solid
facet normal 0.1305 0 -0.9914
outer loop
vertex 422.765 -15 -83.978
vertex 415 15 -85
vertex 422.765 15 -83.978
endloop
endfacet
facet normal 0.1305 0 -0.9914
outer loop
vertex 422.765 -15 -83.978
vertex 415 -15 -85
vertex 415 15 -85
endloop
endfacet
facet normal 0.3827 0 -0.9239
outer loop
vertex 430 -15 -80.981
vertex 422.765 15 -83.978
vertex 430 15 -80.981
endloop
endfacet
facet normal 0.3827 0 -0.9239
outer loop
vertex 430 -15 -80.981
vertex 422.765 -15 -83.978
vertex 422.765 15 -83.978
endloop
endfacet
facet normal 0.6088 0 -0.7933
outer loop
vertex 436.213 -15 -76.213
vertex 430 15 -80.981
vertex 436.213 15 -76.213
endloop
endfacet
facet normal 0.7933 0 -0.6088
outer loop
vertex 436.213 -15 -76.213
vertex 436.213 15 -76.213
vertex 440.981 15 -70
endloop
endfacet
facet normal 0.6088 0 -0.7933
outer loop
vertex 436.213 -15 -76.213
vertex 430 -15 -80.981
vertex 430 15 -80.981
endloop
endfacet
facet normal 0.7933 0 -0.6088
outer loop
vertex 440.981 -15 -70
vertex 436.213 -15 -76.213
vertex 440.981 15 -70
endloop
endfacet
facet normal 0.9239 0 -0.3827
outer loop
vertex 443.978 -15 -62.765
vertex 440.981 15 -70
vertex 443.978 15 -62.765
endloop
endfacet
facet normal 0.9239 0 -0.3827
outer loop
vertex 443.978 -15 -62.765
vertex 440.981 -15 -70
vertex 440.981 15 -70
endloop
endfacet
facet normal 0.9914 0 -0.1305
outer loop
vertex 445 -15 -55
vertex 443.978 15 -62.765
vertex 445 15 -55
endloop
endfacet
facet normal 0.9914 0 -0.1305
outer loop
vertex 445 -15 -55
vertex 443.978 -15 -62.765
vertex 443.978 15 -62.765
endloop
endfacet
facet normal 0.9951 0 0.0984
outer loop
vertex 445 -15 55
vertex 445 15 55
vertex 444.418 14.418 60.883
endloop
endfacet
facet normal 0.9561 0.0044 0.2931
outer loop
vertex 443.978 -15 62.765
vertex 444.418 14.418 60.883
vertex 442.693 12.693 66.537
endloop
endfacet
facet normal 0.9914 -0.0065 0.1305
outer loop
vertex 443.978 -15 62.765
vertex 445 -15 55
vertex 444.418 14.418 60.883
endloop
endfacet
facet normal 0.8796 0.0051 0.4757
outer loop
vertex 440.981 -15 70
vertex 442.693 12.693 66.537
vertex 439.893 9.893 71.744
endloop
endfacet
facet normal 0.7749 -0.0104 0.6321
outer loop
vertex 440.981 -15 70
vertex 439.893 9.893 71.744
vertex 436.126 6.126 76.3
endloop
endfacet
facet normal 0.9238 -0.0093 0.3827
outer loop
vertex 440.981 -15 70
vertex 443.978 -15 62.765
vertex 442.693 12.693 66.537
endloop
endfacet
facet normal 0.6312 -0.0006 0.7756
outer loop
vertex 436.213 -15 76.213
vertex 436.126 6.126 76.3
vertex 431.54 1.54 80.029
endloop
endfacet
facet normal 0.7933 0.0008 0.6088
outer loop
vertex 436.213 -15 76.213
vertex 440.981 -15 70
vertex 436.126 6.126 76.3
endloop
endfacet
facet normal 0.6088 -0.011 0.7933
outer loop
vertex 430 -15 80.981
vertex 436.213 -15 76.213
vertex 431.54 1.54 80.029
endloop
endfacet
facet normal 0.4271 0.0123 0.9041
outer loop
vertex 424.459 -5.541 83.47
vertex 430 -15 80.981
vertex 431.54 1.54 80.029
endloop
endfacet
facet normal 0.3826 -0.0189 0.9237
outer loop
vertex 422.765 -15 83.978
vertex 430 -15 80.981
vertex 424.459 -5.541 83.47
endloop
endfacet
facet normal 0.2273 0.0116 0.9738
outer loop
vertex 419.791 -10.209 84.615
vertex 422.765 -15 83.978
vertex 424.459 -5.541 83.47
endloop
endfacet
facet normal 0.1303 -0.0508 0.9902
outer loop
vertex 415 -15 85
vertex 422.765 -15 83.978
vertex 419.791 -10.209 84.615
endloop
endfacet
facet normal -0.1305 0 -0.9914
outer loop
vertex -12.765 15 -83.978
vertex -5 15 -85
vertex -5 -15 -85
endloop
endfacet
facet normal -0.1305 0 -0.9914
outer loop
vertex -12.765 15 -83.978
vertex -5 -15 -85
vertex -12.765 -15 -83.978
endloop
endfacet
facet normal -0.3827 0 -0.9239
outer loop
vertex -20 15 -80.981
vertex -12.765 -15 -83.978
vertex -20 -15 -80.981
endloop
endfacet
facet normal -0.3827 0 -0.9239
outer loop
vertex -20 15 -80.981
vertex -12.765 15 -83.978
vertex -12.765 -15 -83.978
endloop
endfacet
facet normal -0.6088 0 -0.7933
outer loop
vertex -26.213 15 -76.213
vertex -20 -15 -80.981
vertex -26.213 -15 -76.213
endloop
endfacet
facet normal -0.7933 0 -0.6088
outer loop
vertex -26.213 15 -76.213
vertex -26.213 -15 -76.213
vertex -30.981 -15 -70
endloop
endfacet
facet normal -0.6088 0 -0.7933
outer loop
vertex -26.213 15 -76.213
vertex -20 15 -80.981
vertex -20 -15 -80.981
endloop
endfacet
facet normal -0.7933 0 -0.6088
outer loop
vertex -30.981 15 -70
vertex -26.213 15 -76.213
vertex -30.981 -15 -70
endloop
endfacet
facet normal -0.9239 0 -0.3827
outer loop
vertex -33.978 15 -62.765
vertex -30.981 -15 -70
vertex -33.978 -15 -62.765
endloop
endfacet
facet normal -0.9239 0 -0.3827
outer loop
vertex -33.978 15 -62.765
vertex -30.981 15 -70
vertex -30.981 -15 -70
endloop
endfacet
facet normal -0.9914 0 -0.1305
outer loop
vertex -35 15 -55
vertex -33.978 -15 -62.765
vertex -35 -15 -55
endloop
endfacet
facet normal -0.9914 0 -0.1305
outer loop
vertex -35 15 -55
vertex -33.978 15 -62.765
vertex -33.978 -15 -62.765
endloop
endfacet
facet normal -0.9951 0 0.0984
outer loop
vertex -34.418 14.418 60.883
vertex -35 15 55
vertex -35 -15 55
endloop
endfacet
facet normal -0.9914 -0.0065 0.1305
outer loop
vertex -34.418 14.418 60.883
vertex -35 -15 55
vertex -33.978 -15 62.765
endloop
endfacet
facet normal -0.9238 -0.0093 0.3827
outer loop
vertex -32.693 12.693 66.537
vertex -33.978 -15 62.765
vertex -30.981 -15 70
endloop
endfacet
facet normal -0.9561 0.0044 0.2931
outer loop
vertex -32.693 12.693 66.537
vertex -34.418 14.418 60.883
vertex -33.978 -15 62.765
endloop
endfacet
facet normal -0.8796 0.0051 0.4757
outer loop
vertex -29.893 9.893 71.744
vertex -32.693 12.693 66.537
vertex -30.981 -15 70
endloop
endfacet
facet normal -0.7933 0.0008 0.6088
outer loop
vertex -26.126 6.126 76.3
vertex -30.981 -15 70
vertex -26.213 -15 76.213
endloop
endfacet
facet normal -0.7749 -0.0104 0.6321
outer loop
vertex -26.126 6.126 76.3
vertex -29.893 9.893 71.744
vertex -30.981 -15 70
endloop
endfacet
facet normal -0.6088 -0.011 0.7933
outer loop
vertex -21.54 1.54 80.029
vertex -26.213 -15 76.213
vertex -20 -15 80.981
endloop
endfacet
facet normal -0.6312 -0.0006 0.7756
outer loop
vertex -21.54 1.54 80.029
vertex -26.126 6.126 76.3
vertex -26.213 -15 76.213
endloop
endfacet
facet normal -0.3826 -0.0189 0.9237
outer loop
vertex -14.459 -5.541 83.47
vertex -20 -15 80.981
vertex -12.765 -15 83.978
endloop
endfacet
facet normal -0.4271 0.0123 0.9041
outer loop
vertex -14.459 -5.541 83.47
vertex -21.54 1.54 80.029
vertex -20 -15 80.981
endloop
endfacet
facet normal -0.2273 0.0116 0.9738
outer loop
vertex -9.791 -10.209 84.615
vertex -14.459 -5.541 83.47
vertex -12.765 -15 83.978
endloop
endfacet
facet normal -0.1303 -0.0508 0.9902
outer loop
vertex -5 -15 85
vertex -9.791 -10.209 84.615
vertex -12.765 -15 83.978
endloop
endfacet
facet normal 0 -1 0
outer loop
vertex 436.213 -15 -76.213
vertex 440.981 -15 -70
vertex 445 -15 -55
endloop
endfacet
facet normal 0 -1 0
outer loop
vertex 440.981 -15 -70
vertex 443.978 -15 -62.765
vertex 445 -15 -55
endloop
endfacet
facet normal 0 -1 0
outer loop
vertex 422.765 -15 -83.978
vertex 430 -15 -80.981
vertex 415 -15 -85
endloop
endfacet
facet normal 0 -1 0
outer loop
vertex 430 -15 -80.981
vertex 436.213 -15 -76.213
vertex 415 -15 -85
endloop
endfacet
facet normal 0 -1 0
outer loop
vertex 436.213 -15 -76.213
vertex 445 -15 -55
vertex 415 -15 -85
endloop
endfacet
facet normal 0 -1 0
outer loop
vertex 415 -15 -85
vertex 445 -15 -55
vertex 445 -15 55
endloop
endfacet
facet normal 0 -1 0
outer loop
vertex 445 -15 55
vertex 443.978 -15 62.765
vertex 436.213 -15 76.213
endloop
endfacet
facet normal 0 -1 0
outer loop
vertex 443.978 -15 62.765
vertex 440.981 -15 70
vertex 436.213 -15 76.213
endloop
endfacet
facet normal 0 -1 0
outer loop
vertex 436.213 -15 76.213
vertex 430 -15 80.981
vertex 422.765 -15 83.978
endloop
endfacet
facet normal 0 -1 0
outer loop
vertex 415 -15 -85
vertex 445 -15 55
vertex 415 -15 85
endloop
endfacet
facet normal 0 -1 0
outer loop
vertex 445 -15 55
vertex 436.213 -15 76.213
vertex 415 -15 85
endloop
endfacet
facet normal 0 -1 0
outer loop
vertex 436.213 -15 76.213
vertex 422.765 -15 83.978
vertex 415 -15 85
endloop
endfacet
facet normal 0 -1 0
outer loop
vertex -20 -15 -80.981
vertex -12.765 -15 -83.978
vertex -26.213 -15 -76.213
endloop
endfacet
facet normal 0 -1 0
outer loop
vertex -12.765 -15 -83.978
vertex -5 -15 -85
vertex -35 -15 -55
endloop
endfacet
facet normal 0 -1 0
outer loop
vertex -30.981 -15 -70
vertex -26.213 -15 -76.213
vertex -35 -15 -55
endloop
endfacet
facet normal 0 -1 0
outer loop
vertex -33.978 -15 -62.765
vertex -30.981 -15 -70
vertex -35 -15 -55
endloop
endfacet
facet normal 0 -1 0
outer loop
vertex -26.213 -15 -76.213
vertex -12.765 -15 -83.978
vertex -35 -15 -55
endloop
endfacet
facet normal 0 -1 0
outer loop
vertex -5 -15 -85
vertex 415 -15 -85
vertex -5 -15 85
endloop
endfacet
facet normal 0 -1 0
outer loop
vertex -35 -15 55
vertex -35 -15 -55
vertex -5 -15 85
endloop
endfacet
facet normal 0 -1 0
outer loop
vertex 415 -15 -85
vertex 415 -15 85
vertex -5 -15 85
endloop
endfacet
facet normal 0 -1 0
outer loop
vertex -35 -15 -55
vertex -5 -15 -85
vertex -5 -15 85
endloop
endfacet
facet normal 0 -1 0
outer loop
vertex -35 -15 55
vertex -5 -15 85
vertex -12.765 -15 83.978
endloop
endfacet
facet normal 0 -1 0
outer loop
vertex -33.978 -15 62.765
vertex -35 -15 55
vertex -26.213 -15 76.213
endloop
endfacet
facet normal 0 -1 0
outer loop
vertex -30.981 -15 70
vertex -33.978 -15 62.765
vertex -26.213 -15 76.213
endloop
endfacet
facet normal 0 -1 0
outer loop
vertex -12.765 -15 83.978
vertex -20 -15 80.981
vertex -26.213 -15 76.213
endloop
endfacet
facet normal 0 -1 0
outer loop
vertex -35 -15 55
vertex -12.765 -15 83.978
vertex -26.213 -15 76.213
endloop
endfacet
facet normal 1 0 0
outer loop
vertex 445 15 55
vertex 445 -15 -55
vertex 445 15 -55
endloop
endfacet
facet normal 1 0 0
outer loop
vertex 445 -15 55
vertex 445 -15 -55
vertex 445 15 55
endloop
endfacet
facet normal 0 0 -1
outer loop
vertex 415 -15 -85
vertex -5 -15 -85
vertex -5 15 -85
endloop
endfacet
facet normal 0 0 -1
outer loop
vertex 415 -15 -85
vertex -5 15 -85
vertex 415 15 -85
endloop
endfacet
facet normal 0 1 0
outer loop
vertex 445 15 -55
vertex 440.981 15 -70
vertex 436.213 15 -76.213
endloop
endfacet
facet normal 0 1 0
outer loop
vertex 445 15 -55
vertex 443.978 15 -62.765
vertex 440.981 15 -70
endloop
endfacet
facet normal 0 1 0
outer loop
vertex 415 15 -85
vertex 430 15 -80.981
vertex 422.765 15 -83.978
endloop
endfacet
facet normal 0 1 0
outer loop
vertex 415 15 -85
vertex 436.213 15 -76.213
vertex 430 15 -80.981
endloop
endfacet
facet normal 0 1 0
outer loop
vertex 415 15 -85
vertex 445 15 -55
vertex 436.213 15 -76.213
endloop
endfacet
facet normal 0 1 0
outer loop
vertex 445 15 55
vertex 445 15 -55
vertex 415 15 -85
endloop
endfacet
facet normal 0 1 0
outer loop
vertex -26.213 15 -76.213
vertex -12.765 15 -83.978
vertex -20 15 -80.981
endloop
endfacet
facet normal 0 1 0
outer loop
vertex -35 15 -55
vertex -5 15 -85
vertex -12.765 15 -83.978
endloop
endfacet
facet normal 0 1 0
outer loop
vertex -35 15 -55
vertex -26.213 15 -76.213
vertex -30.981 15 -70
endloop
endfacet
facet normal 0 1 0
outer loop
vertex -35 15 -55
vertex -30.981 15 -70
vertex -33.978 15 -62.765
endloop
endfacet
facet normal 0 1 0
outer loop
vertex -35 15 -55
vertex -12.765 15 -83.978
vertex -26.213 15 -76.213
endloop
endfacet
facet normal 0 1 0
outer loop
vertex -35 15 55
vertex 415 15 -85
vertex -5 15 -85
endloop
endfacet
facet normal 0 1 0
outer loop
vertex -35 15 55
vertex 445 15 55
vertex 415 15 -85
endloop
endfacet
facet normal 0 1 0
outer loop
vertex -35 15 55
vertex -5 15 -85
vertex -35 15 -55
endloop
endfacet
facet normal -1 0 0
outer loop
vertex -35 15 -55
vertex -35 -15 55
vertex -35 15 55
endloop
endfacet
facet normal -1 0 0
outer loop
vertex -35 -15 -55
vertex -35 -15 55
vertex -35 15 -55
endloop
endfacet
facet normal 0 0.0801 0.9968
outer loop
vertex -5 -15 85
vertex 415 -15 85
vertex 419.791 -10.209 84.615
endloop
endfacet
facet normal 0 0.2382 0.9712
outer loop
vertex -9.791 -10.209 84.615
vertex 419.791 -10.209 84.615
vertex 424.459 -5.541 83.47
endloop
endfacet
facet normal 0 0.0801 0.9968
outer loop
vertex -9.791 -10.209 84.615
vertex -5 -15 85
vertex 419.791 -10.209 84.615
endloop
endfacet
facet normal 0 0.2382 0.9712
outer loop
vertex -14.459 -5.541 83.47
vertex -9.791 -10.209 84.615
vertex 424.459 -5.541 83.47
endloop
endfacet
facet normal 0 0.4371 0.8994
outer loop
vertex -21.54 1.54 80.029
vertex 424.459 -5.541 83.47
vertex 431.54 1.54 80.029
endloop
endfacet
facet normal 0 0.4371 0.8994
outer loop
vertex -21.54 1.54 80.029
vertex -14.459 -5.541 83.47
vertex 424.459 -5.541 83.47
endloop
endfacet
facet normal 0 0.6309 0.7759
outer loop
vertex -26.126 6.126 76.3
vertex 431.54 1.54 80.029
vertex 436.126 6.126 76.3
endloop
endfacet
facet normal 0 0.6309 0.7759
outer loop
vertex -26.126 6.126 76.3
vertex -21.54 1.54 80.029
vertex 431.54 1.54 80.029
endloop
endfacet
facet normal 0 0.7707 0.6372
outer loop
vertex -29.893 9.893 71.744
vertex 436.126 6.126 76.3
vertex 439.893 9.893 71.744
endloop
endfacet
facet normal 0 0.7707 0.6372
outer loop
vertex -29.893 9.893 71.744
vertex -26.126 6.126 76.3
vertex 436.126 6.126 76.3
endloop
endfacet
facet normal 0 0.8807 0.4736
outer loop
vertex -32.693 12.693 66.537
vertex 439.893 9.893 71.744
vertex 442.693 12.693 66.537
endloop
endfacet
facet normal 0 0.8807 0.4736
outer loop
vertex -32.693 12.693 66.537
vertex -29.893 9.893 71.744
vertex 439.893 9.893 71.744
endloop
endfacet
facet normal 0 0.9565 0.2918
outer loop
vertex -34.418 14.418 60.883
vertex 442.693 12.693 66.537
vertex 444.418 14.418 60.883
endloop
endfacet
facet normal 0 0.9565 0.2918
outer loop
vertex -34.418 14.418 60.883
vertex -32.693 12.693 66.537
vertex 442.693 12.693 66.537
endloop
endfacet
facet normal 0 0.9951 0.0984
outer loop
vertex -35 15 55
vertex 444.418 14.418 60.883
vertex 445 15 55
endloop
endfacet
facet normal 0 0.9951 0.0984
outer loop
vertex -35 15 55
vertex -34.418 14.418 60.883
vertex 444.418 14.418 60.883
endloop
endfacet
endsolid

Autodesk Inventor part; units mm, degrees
ref_plane "YZ Plane" through (0, 0, 0) normal (1, 0, 0) x (0, 1, 0)
ref_plane "XZ Plane" through (0, 0, 0) normal (0, 1, 0) x (-1, 0, 0)
ref_plane "XY Plane" through (0, 0, 0) normal (0, 0, 1) x (1, 0, 0)
sketch "Эскиз1" plane through (0, 0, 0) normal (0, 1, 0) x (-1, 0, 0)
  line L0 (35, -85) -> (-445, -85)
  line L1 (-445, -85) -> (-445, 85)
  line L2 (-445, 85) -> (35, 85)
  line L3 (35, 85) -> (35, -85)
  point P0 (0, 0)
  point P1 (35, 0)
  dimension "d0" = 480
  dimension "d1" = 170
  dimension "d2" = 35
extrude "Выдавливание1" add sketch "Эскиз1" along normal mid plane 30
fillet "Сопряжение1" radius 30 5 edges at (445, 0, 85) (-35, 0, 85) (445, 0, -85) (-35, 0, -85) (205, 15, 85)
properties part number "Подставка1"
